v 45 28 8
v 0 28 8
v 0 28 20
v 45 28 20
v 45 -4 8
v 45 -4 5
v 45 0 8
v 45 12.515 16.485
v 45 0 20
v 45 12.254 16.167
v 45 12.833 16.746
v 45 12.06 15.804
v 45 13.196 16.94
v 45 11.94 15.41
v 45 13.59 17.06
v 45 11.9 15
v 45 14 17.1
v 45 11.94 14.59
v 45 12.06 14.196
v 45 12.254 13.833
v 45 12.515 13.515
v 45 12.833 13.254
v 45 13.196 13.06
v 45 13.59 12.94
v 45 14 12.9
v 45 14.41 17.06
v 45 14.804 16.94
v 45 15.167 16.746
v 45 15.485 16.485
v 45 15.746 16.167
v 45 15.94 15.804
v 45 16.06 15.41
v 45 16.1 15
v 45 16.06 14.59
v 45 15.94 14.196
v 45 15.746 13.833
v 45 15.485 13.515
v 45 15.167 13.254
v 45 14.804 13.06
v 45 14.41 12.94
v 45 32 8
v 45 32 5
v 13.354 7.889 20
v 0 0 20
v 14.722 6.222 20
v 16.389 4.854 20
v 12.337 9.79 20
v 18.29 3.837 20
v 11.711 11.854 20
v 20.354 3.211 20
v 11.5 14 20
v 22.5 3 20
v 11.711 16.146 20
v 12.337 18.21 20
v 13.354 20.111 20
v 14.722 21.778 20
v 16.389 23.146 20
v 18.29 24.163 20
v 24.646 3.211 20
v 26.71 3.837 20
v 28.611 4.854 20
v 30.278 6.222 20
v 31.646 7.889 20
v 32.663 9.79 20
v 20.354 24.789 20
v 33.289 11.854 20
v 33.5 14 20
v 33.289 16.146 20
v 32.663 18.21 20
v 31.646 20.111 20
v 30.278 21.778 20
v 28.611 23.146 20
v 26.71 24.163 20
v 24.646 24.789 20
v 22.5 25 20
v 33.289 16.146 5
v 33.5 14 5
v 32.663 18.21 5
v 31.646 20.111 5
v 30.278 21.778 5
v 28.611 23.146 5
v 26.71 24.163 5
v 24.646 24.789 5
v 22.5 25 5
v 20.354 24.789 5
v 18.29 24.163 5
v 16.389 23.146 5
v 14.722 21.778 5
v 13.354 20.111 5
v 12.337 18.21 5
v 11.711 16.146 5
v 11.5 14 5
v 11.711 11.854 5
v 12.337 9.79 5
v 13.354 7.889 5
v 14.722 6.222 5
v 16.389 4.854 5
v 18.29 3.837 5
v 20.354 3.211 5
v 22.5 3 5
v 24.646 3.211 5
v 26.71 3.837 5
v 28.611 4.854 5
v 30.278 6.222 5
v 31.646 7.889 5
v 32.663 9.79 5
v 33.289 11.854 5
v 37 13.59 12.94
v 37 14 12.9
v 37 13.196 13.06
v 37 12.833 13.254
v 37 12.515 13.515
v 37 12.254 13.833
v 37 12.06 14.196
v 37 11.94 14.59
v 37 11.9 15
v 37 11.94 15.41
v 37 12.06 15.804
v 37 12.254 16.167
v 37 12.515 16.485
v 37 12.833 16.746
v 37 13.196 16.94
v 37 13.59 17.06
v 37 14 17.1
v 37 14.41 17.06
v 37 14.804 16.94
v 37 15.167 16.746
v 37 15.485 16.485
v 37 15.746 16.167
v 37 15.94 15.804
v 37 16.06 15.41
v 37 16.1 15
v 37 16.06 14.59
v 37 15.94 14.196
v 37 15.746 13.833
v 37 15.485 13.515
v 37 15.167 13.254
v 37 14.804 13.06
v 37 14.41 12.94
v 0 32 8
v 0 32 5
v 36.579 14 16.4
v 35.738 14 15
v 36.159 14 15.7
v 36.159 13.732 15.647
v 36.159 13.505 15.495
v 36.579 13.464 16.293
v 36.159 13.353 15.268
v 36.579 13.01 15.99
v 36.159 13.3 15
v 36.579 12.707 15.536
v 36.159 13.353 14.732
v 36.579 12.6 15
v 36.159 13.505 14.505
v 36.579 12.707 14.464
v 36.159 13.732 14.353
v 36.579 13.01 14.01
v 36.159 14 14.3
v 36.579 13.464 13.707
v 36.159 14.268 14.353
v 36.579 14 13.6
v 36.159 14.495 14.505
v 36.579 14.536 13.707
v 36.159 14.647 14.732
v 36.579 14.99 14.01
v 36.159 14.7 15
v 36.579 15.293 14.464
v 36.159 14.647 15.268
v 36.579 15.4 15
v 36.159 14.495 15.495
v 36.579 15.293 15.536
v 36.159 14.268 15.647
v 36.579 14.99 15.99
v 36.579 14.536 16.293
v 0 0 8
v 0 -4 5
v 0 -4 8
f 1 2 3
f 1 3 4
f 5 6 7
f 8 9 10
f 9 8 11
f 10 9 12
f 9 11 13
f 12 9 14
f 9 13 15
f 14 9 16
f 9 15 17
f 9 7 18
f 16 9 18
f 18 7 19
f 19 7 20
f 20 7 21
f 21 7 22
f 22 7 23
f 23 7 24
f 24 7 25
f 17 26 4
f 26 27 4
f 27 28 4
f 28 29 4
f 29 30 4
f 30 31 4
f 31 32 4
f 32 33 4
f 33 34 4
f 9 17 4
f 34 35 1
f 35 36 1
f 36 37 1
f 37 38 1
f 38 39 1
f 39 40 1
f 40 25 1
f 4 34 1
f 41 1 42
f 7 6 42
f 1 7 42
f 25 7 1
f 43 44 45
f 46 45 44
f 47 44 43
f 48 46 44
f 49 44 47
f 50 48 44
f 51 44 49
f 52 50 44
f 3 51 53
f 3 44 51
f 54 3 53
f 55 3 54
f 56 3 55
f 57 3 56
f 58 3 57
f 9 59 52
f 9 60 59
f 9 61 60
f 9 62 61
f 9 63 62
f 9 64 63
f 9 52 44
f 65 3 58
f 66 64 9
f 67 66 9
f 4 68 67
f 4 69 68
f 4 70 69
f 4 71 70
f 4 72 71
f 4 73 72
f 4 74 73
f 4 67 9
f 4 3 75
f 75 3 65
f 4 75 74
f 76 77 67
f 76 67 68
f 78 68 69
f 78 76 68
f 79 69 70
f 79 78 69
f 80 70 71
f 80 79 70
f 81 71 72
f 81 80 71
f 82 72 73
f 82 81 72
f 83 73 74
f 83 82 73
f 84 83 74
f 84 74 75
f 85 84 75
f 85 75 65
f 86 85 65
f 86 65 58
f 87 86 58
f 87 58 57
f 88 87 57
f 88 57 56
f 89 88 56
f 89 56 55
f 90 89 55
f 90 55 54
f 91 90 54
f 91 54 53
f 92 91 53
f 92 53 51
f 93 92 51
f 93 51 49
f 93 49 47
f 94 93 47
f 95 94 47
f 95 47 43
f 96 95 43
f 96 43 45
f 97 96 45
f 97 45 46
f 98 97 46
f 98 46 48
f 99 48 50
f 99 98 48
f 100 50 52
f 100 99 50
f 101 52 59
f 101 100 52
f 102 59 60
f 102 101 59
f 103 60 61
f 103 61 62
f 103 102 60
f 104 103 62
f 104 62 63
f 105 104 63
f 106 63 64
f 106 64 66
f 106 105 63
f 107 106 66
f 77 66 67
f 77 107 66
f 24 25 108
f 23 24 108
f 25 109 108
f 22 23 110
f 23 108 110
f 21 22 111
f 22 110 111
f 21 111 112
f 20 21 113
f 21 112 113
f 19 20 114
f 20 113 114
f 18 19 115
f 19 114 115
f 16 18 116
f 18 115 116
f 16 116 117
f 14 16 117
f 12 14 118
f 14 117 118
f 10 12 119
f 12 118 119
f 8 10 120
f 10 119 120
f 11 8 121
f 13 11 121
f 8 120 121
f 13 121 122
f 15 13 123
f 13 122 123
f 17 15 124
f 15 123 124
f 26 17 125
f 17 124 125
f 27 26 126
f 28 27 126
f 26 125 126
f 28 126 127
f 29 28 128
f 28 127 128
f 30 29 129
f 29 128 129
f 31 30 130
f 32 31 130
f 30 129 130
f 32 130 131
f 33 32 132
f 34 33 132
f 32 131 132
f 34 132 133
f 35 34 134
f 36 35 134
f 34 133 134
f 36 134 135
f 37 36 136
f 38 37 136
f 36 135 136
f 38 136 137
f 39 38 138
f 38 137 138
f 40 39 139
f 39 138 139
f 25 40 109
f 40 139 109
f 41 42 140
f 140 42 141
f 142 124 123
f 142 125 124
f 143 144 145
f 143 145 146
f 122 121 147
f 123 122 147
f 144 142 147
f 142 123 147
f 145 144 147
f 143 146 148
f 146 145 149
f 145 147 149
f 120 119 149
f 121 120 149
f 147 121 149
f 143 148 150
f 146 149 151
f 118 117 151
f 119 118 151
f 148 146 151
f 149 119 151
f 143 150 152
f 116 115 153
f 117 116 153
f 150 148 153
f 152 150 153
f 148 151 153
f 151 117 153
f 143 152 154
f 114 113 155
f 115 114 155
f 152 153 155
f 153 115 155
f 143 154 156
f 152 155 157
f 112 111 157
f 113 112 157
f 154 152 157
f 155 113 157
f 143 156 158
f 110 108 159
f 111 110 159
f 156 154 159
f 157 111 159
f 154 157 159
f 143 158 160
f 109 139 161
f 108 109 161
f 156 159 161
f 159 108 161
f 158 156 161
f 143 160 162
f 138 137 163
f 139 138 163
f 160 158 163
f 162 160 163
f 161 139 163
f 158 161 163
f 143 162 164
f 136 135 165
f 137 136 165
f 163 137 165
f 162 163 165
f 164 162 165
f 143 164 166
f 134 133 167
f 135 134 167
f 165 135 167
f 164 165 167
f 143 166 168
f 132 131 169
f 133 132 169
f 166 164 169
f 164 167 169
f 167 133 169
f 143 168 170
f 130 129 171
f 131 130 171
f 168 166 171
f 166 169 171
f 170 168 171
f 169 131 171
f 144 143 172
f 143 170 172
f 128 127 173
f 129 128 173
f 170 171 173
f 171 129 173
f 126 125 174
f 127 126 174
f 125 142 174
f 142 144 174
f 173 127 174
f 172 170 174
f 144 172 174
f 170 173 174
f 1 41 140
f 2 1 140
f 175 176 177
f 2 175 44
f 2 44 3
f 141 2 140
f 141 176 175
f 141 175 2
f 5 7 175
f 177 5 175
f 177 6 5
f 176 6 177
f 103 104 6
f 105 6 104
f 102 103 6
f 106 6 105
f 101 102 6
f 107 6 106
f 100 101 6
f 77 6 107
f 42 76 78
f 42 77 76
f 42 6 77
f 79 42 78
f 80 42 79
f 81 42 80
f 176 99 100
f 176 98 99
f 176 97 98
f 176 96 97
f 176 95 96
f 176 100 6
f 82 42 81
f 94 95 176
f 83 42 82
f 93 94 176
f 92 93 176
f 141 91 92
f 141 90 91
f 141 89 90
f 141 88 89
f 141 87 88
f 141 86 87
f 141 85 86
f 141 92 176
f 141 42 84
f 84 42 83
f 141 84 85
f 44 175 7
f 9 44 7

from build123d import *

# Parameters (mm, degrees)
SKETCH1_W                 = 45
SKETCH1_H                 = 28
SKETCH1_R                 = 11
BOSS_EXTRUDE1_DEPTH       = 20
M5X0_8_TAPPED_HOLE1_D     = 4.2
M5X0_8_TAPPED_HOLE1_DEPTH = 8
M5X0_8_TAPPED_HOLE1_TIP   = 1.2618073
SKETCH6_W                 = 45
SKETCH6_H                 = 28
CUT_EXTRUDE1_DEPTH        = 5
SKETCH7_W                 = 45
SKETCH7_H                 = 4
BOSS_EXTRUDE5_DEPTH       = 3


with BuildPart() as part:
    # Sketch1 → Boss-Extrude1 (new body)
    with BuildSketch(Plane.XY):
        with Locations((22.5, 14)):
            Rectangle(SKETCH1_W, SKETCH1_H)
        with Locations((22.5, 14)):
            Circle(SKETCH1_R, mode=Mode.SUBTRACT)
    extrude(amount=BOSS_EXTRUDE1_DEPTH)

    # M5x0.8 Tapped Hole1
    with Locations(Plane(origin=(45, 14, 15), x_dir=(0, 0, 1), z_dir=(1, 0, 0))):
        with Locations((0, 0)):
            Hole(M5X0_8_TAPPED_HOLE1_D / 2, depth=M5X0_8_TAPPED_HOLE1_DEPTH)
            with Locations((0, 0, -(M5X0_8_TAPPED_HOLE1_DEPTH + M5X0_8_TAPPED_HOLE1_TIP / 2))):  # 118° drill point
                Cone(0, M5X0_8_TAPPED_HOLE1_D / 2, M5X0_8_TAPPED_HOLE1_TIP, mode=Mode.SUBTRACT)

    # Sketch6 → Cut-Extrude1 (cut)
    with BuildSketch(Plane(origin=(0, 0, 0), x_dir=(-1, 0, 0), z_dir=(0, 0, -1))):
        with Locations((-22.5, 14)):
            Rectangle(SKETCH6_W, SKETCH6_H)
    extrude(amount=-CUT_EXTRUDE1_DEPTH, mode=Mode.SUBTRACT)

    # Sketch7 → Boss-Extrude5 (add)
    with BuildSketch(Plane(origin=(0, 0, 5), x_dir=(-1, 0, 0), z_dir=(0, 0, -1))):
        with Locations((-22.5, 30)):
            Rectangle(SKETCH7_W, SKETCH7_H)
        with Locations((-22.5, -2)):
            Rectangle(SKETCH7_W, SKETCH7_H)
    extrude(amount=-BOSS_EXTRUDE5_DEPTH)


solid = part.part
